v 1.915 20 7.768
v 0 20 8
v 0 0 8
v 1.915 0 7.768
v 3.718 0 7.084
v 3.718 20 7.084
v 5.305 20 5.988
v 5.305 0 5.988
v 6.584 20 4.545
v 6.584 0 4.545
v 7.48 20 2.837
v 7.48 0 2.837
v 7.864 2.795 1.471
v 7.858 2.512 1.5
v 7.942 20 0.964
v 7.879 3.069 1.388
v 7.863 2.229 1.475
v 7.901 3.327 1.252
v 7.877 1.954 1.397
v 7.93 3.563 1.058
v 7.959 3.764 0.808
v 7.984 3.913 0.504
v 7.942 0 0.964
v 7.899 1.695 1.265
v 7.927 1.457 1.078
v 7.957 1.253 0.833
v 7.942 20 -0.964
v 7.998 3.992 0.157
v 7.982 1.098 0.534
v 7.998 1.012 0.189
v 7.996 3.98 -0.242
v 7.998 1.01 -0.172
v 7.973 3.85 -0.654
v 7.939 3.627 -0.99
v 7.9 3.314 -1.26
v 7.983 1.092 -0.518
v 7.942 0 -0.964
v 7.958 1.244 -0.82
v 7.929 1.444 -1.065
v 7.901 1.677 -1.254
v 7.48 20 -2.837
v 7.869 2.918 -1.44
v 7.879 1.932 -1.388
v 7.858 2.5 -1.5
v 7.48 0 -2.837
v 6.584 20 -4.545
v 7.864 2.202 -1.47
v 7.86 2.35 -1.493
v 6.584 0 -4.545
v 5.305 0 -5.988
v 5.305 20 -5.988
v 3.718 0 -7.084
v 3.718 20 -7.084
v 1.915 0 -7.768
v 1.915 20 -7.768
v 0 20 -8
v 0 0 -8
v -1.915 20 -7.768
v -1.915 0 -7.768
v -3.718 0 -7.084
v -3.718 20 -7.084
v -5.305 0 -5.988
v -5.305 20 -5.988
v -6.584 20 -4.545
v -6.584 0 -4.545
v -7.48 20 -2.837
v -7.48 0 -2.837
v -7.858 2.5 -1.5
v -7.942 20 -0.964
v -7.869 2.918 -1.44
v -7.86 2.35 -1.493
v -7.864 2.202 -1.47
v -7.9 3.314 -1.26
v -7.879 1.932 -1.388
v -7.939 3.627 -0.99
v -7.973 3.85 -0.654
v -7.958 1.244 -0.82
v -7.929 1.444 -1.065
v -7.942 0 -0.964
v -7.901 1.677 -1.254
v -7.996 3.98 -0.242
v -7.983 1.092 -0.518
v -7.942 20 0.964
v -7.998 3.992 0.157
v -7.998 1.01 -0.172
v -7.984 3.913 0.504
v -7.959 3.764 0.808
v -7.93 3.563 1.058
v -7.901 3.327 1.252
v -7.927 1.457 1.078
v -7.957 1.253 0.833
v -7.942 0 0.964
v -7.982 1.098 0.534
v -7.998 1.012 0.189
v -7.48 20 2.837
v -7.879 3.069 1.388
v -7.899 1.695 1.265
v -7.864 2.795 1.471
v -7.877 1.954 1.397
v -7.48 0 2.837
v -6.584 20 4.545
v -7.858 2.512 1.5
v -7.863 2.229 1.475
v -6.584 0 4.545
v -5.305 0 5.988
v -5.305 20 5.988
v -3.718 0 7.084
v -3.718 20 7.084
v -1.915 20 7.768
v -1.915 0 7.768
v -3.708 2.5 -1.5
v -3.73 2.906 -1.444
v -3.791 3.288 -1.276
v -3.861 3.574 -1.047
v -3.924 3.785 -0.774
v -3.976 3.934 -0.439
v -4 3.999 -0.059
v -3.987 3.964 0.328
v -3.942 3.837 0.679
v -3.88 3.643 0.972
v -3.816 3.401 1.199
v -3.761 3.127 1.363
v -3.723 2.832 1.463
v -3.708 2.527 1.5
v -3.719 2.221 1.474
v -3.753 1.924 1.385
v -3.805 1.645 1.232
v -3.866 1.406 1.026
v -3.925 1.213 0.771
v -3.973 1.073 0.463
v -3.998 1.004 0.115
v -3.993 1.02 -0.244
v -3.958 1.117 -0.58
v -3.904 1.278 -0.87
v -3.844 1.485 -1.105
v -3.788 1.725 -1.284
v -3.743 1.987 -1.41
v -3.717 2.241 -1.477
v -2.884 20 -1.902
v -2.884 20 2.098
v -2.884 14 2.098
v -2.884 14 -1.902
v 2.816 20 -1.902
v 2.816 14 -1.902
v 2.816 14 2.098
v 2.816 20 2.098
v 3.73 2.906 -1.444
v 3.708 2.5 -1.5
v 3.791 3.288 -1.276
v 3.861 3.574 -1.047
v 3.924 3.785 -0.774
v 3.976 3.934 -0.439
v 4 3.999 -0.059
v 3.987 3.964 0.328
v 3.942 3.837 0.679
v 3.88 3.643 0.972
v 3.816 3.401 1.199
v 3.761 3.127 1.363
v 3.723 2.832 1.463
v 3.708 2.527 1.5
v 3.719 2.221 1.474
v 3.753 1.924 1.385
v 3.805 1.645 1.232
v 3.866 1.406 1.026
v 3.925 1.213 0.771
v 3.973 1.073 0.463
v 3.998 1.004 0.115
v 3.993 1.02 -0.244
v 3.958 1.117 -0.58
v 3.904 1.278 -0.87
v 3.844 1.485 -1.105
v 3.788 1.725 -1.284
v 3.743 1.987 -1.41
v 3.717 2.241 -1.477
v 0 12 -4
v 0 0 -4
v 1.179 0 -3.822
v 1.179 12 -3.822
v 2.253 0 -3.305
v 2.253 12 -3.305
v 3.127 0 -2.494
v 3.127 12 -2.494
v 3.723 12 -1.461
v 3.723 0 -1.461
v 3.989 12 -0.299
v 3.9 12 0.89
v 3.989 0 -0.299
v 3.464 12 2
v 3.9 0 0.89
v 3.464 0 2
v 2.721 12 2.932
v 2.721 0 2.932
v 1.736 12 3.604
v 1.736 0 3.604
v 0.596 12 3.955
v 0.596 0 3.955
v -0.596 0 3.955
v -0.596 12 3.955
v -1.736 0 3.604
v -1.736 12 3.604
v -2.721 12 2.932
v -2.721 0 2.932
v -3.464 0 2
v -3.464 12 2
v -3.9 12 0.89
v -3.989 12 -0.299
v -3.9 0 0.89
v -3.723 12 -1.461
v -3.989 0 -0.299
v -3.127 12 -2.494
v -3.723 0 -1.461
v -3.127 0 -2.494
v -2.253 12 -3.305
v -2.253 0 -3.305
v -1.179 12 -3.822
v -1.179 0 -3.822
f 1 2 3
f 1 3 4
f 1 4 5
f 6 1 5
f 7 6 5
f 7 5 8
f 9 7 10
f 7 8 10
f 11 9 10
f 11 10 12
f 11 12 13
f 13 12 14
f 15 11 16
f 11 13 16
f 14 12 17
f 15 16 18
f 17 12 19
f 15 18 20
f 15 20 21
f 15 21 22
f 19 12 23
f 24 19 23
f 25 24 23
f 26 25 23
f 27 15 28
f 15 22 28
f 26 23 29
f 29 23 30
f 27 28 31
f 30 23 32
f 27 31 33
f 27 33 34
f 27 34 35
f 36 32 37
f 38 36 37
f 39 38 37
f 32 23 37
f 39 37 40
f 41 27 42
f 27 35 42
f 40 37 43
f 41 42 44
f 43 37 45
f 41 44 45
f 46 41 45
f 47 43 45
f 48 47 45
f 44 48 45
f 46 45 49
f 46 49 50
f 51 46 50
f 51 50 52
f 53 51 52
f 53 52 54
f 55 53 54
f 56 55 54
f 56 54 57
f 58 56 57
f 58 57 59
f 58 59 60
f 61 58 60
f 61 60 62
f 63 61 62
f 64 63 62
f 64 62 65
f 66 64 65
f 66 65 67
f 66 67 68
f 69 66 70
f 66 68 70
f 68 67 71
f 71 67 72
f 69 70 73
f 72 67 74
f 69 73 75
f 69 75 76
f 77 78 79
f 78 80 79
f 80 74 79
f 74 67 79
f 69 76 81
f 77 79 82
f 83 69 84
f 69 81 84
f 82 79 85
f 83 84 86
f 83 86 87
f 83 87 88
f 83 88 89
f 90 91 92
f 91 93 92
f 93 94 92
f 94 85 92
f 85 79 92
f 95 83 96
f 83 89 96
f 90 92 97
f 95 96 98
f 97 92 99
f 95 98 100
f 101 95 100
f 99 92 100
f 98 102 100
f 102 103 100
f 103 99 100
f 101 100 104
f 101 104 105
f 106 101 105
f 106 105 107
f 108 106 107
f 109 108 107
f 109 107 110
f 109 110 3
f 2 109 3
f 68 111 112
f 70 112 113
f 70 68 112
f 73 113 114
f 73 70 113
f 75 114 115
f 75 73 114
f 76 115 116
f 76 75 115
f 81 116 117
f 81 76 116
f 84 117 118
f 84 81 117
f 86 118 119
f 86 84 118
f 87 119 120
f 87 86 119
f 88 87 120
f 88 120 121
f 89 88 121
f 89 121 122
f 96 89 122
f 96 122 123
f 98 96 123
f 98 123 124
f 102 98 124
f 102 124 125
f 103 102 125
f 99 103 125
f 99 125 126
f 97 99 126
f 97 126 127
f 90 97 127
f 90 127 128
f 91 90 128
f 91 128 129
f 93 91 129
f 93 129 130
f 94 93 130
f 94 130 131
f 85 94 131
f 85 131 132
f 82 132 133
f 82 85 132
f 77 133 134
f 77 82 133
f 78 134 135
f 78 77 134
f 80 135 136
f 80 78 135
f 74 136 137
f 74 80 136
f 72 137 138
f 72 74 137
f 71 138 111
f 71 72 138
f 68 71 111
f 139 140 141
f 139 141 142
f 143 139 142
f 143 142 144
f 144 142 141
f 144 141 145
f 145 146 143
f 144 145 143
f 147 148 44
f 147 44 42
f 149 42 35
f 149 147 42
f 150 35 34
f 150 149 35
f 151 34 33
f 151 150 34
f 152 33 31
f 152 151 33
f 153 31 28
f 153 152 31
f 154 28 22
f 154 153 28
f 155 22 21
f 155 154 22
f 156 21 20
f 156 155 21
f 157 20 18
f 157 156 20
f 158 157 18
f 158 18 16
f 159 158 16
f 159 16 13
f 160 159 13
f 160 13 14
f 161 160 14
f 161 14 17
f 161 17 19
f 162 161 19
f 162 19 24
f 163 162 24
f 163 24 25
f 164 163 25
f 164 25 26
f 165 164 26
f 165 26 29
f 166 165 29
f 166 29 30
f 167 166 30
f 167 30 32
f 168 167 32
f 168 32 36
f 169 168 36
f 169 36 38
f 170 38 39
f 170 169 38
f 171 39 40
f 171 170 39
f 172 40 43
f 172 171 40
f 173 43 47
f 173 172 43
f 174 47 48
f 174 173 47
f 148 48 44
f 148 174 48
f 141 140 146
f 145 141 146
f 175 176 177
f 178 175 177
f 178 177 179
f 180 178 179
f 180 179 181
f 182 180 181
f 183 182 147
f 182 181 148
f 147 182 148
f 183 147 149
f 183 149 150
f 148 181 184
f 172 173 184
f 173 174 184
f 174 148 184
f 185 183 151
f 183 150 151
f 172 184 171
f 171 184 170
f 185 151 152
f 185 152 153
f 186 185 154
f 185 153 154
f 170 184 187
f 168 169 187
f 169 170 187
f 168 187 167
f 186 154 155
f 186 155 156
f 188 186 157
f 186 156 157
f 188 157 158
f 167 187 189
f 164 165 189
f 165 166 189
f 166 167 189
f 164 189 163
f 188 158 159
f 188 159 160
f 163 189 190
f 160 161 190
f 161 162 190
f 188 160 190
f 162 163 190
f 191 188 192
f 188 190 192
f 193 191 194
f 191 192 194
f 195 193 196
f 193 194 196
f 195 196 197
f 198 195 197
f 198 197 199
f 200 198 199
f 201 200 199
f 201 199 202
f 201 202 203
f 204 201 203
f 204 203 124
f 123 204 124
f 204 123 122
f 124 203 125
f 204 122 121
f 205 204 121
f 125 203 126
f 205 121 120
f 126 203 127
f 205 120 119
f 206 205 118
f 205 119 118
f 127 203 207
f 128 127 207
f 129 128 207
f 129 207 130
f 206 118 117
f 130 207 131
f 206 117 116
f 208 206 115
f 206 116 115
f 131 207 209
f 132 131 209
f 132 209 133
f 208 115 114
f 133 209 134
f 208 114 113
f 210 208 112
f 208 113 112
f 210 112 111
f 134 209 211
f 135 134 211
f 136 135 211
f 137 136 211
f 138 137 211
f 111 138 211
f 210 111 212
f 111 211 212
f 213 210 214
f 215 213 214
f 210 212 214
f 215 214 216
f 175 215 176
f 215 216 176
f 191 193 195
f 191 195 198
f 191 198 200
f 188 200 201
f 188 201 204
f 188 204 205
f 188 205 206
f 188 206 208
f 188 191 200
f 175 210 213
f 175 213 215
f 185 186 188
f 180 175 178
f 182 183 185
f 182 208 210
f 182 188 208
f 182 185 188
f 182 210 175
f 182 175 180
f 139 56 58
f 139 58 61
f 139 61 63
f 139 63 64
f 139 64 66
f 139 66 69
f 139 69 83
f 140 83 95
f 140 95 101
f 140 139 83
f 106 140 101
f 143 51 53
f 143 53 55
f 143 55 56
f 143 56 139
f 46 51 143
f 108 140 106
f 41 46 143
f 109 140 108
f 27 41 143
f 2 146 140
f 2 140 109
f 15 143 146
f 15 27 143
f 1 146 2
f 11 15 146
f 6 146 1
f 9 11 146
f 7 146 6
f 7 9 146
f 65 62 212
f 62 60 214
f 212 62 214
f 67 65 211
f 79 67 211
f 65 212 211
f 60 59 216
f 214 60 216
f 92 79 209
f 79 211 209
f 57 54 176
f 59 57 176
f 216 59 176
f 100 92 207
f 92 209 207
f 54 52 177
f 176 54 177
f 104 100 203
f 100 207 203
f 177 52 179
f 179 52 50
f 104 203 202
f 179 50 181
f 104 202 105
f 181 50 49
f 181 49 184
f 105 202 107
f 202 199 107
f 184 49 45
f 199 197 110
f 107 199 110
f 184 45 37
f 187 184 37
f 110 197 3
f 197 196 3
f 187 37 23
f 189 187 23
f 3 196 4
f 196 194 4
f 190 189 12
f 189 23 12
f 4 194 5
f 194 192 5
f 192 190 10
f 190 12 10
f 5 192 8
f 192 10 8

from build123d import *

# Parameters (mm, degrees)
SKETCH3_R               = 8
BOSS_EXTRUDE1_DEPTH     = 20
SKETCH4_R               = 4
CUT_EXTRUDE1_DEPTH      = 12
CUT_EXTRUDE2_DEPTH      = 23.978250586
CUT_EXTRUDE2_DEPTH_BACK = 23.978250586
SKETCH5_R               = 1.5
SKETCH6_W               = 5.7
SKETCH6_H               = 4
CUT_EXTRUDE3_DEPTH      = 6


with BuildPart() as part:
    # Sketch3 → Boss-Extrude1 (new body)
    with BuildSketch(Plane(origin=(0, 0, 0), x_dir=(1, 0, 0), z_dir=(0, 1, 0))):
        with Locations(Location((0, 0, 0), (0, 0, 270))):
            Circle(SKETCH3_R)
    extrude(amount=BOSS_EXTRUDE1_DEPTH)

    # Sketch4 → Cut-Extrude1 (cut)
    with BuildSketch(Plane.XZ):
        with Locations(Location((0, 0, 0), (0, 0, 270))):
            Circle(SKETCH4_R)
    extrude(amount=-CUT_EXTRUDE1_DEPTH, mode=Mode.SUBTRACT)

    # Sketch5 → Cut-Extrude2 (cut, two sides: drawn at the far end of the back side and taken through both)
    with BuildSketch(Plane(origin=(0, 0, 0), x_dir=(0, 0, -1), z_dir=(1, 0, 0)).offset(-CUT_EXTRUDE2_DEPTH_BACK)):
        with Locations((0, 2.5)):
            Circle(SKETCH5_R)
    extrude(amount=CUT_EXTRUDE2_DEPTH + CUT_EXTRUDE2_DEPTH_BACK, mode=Mode.SUBTRACT)

    # Sketch6 → Cut-Extrude3 (cut)
    with BuildSketch(Plane(origin=(0, 20, 0), x_dir=(1, 0, 0), z_dir=(0, 1, 0))):
        with Locations((-0.034439742, -0.098165146)):
            Rectangle(SKETCH6_W, SKETCH6_H)
    extrude(amount=-CUT_EXTRUDE3_DEPTH, mode=Mode.SUBTRACT)


solid = part.part
